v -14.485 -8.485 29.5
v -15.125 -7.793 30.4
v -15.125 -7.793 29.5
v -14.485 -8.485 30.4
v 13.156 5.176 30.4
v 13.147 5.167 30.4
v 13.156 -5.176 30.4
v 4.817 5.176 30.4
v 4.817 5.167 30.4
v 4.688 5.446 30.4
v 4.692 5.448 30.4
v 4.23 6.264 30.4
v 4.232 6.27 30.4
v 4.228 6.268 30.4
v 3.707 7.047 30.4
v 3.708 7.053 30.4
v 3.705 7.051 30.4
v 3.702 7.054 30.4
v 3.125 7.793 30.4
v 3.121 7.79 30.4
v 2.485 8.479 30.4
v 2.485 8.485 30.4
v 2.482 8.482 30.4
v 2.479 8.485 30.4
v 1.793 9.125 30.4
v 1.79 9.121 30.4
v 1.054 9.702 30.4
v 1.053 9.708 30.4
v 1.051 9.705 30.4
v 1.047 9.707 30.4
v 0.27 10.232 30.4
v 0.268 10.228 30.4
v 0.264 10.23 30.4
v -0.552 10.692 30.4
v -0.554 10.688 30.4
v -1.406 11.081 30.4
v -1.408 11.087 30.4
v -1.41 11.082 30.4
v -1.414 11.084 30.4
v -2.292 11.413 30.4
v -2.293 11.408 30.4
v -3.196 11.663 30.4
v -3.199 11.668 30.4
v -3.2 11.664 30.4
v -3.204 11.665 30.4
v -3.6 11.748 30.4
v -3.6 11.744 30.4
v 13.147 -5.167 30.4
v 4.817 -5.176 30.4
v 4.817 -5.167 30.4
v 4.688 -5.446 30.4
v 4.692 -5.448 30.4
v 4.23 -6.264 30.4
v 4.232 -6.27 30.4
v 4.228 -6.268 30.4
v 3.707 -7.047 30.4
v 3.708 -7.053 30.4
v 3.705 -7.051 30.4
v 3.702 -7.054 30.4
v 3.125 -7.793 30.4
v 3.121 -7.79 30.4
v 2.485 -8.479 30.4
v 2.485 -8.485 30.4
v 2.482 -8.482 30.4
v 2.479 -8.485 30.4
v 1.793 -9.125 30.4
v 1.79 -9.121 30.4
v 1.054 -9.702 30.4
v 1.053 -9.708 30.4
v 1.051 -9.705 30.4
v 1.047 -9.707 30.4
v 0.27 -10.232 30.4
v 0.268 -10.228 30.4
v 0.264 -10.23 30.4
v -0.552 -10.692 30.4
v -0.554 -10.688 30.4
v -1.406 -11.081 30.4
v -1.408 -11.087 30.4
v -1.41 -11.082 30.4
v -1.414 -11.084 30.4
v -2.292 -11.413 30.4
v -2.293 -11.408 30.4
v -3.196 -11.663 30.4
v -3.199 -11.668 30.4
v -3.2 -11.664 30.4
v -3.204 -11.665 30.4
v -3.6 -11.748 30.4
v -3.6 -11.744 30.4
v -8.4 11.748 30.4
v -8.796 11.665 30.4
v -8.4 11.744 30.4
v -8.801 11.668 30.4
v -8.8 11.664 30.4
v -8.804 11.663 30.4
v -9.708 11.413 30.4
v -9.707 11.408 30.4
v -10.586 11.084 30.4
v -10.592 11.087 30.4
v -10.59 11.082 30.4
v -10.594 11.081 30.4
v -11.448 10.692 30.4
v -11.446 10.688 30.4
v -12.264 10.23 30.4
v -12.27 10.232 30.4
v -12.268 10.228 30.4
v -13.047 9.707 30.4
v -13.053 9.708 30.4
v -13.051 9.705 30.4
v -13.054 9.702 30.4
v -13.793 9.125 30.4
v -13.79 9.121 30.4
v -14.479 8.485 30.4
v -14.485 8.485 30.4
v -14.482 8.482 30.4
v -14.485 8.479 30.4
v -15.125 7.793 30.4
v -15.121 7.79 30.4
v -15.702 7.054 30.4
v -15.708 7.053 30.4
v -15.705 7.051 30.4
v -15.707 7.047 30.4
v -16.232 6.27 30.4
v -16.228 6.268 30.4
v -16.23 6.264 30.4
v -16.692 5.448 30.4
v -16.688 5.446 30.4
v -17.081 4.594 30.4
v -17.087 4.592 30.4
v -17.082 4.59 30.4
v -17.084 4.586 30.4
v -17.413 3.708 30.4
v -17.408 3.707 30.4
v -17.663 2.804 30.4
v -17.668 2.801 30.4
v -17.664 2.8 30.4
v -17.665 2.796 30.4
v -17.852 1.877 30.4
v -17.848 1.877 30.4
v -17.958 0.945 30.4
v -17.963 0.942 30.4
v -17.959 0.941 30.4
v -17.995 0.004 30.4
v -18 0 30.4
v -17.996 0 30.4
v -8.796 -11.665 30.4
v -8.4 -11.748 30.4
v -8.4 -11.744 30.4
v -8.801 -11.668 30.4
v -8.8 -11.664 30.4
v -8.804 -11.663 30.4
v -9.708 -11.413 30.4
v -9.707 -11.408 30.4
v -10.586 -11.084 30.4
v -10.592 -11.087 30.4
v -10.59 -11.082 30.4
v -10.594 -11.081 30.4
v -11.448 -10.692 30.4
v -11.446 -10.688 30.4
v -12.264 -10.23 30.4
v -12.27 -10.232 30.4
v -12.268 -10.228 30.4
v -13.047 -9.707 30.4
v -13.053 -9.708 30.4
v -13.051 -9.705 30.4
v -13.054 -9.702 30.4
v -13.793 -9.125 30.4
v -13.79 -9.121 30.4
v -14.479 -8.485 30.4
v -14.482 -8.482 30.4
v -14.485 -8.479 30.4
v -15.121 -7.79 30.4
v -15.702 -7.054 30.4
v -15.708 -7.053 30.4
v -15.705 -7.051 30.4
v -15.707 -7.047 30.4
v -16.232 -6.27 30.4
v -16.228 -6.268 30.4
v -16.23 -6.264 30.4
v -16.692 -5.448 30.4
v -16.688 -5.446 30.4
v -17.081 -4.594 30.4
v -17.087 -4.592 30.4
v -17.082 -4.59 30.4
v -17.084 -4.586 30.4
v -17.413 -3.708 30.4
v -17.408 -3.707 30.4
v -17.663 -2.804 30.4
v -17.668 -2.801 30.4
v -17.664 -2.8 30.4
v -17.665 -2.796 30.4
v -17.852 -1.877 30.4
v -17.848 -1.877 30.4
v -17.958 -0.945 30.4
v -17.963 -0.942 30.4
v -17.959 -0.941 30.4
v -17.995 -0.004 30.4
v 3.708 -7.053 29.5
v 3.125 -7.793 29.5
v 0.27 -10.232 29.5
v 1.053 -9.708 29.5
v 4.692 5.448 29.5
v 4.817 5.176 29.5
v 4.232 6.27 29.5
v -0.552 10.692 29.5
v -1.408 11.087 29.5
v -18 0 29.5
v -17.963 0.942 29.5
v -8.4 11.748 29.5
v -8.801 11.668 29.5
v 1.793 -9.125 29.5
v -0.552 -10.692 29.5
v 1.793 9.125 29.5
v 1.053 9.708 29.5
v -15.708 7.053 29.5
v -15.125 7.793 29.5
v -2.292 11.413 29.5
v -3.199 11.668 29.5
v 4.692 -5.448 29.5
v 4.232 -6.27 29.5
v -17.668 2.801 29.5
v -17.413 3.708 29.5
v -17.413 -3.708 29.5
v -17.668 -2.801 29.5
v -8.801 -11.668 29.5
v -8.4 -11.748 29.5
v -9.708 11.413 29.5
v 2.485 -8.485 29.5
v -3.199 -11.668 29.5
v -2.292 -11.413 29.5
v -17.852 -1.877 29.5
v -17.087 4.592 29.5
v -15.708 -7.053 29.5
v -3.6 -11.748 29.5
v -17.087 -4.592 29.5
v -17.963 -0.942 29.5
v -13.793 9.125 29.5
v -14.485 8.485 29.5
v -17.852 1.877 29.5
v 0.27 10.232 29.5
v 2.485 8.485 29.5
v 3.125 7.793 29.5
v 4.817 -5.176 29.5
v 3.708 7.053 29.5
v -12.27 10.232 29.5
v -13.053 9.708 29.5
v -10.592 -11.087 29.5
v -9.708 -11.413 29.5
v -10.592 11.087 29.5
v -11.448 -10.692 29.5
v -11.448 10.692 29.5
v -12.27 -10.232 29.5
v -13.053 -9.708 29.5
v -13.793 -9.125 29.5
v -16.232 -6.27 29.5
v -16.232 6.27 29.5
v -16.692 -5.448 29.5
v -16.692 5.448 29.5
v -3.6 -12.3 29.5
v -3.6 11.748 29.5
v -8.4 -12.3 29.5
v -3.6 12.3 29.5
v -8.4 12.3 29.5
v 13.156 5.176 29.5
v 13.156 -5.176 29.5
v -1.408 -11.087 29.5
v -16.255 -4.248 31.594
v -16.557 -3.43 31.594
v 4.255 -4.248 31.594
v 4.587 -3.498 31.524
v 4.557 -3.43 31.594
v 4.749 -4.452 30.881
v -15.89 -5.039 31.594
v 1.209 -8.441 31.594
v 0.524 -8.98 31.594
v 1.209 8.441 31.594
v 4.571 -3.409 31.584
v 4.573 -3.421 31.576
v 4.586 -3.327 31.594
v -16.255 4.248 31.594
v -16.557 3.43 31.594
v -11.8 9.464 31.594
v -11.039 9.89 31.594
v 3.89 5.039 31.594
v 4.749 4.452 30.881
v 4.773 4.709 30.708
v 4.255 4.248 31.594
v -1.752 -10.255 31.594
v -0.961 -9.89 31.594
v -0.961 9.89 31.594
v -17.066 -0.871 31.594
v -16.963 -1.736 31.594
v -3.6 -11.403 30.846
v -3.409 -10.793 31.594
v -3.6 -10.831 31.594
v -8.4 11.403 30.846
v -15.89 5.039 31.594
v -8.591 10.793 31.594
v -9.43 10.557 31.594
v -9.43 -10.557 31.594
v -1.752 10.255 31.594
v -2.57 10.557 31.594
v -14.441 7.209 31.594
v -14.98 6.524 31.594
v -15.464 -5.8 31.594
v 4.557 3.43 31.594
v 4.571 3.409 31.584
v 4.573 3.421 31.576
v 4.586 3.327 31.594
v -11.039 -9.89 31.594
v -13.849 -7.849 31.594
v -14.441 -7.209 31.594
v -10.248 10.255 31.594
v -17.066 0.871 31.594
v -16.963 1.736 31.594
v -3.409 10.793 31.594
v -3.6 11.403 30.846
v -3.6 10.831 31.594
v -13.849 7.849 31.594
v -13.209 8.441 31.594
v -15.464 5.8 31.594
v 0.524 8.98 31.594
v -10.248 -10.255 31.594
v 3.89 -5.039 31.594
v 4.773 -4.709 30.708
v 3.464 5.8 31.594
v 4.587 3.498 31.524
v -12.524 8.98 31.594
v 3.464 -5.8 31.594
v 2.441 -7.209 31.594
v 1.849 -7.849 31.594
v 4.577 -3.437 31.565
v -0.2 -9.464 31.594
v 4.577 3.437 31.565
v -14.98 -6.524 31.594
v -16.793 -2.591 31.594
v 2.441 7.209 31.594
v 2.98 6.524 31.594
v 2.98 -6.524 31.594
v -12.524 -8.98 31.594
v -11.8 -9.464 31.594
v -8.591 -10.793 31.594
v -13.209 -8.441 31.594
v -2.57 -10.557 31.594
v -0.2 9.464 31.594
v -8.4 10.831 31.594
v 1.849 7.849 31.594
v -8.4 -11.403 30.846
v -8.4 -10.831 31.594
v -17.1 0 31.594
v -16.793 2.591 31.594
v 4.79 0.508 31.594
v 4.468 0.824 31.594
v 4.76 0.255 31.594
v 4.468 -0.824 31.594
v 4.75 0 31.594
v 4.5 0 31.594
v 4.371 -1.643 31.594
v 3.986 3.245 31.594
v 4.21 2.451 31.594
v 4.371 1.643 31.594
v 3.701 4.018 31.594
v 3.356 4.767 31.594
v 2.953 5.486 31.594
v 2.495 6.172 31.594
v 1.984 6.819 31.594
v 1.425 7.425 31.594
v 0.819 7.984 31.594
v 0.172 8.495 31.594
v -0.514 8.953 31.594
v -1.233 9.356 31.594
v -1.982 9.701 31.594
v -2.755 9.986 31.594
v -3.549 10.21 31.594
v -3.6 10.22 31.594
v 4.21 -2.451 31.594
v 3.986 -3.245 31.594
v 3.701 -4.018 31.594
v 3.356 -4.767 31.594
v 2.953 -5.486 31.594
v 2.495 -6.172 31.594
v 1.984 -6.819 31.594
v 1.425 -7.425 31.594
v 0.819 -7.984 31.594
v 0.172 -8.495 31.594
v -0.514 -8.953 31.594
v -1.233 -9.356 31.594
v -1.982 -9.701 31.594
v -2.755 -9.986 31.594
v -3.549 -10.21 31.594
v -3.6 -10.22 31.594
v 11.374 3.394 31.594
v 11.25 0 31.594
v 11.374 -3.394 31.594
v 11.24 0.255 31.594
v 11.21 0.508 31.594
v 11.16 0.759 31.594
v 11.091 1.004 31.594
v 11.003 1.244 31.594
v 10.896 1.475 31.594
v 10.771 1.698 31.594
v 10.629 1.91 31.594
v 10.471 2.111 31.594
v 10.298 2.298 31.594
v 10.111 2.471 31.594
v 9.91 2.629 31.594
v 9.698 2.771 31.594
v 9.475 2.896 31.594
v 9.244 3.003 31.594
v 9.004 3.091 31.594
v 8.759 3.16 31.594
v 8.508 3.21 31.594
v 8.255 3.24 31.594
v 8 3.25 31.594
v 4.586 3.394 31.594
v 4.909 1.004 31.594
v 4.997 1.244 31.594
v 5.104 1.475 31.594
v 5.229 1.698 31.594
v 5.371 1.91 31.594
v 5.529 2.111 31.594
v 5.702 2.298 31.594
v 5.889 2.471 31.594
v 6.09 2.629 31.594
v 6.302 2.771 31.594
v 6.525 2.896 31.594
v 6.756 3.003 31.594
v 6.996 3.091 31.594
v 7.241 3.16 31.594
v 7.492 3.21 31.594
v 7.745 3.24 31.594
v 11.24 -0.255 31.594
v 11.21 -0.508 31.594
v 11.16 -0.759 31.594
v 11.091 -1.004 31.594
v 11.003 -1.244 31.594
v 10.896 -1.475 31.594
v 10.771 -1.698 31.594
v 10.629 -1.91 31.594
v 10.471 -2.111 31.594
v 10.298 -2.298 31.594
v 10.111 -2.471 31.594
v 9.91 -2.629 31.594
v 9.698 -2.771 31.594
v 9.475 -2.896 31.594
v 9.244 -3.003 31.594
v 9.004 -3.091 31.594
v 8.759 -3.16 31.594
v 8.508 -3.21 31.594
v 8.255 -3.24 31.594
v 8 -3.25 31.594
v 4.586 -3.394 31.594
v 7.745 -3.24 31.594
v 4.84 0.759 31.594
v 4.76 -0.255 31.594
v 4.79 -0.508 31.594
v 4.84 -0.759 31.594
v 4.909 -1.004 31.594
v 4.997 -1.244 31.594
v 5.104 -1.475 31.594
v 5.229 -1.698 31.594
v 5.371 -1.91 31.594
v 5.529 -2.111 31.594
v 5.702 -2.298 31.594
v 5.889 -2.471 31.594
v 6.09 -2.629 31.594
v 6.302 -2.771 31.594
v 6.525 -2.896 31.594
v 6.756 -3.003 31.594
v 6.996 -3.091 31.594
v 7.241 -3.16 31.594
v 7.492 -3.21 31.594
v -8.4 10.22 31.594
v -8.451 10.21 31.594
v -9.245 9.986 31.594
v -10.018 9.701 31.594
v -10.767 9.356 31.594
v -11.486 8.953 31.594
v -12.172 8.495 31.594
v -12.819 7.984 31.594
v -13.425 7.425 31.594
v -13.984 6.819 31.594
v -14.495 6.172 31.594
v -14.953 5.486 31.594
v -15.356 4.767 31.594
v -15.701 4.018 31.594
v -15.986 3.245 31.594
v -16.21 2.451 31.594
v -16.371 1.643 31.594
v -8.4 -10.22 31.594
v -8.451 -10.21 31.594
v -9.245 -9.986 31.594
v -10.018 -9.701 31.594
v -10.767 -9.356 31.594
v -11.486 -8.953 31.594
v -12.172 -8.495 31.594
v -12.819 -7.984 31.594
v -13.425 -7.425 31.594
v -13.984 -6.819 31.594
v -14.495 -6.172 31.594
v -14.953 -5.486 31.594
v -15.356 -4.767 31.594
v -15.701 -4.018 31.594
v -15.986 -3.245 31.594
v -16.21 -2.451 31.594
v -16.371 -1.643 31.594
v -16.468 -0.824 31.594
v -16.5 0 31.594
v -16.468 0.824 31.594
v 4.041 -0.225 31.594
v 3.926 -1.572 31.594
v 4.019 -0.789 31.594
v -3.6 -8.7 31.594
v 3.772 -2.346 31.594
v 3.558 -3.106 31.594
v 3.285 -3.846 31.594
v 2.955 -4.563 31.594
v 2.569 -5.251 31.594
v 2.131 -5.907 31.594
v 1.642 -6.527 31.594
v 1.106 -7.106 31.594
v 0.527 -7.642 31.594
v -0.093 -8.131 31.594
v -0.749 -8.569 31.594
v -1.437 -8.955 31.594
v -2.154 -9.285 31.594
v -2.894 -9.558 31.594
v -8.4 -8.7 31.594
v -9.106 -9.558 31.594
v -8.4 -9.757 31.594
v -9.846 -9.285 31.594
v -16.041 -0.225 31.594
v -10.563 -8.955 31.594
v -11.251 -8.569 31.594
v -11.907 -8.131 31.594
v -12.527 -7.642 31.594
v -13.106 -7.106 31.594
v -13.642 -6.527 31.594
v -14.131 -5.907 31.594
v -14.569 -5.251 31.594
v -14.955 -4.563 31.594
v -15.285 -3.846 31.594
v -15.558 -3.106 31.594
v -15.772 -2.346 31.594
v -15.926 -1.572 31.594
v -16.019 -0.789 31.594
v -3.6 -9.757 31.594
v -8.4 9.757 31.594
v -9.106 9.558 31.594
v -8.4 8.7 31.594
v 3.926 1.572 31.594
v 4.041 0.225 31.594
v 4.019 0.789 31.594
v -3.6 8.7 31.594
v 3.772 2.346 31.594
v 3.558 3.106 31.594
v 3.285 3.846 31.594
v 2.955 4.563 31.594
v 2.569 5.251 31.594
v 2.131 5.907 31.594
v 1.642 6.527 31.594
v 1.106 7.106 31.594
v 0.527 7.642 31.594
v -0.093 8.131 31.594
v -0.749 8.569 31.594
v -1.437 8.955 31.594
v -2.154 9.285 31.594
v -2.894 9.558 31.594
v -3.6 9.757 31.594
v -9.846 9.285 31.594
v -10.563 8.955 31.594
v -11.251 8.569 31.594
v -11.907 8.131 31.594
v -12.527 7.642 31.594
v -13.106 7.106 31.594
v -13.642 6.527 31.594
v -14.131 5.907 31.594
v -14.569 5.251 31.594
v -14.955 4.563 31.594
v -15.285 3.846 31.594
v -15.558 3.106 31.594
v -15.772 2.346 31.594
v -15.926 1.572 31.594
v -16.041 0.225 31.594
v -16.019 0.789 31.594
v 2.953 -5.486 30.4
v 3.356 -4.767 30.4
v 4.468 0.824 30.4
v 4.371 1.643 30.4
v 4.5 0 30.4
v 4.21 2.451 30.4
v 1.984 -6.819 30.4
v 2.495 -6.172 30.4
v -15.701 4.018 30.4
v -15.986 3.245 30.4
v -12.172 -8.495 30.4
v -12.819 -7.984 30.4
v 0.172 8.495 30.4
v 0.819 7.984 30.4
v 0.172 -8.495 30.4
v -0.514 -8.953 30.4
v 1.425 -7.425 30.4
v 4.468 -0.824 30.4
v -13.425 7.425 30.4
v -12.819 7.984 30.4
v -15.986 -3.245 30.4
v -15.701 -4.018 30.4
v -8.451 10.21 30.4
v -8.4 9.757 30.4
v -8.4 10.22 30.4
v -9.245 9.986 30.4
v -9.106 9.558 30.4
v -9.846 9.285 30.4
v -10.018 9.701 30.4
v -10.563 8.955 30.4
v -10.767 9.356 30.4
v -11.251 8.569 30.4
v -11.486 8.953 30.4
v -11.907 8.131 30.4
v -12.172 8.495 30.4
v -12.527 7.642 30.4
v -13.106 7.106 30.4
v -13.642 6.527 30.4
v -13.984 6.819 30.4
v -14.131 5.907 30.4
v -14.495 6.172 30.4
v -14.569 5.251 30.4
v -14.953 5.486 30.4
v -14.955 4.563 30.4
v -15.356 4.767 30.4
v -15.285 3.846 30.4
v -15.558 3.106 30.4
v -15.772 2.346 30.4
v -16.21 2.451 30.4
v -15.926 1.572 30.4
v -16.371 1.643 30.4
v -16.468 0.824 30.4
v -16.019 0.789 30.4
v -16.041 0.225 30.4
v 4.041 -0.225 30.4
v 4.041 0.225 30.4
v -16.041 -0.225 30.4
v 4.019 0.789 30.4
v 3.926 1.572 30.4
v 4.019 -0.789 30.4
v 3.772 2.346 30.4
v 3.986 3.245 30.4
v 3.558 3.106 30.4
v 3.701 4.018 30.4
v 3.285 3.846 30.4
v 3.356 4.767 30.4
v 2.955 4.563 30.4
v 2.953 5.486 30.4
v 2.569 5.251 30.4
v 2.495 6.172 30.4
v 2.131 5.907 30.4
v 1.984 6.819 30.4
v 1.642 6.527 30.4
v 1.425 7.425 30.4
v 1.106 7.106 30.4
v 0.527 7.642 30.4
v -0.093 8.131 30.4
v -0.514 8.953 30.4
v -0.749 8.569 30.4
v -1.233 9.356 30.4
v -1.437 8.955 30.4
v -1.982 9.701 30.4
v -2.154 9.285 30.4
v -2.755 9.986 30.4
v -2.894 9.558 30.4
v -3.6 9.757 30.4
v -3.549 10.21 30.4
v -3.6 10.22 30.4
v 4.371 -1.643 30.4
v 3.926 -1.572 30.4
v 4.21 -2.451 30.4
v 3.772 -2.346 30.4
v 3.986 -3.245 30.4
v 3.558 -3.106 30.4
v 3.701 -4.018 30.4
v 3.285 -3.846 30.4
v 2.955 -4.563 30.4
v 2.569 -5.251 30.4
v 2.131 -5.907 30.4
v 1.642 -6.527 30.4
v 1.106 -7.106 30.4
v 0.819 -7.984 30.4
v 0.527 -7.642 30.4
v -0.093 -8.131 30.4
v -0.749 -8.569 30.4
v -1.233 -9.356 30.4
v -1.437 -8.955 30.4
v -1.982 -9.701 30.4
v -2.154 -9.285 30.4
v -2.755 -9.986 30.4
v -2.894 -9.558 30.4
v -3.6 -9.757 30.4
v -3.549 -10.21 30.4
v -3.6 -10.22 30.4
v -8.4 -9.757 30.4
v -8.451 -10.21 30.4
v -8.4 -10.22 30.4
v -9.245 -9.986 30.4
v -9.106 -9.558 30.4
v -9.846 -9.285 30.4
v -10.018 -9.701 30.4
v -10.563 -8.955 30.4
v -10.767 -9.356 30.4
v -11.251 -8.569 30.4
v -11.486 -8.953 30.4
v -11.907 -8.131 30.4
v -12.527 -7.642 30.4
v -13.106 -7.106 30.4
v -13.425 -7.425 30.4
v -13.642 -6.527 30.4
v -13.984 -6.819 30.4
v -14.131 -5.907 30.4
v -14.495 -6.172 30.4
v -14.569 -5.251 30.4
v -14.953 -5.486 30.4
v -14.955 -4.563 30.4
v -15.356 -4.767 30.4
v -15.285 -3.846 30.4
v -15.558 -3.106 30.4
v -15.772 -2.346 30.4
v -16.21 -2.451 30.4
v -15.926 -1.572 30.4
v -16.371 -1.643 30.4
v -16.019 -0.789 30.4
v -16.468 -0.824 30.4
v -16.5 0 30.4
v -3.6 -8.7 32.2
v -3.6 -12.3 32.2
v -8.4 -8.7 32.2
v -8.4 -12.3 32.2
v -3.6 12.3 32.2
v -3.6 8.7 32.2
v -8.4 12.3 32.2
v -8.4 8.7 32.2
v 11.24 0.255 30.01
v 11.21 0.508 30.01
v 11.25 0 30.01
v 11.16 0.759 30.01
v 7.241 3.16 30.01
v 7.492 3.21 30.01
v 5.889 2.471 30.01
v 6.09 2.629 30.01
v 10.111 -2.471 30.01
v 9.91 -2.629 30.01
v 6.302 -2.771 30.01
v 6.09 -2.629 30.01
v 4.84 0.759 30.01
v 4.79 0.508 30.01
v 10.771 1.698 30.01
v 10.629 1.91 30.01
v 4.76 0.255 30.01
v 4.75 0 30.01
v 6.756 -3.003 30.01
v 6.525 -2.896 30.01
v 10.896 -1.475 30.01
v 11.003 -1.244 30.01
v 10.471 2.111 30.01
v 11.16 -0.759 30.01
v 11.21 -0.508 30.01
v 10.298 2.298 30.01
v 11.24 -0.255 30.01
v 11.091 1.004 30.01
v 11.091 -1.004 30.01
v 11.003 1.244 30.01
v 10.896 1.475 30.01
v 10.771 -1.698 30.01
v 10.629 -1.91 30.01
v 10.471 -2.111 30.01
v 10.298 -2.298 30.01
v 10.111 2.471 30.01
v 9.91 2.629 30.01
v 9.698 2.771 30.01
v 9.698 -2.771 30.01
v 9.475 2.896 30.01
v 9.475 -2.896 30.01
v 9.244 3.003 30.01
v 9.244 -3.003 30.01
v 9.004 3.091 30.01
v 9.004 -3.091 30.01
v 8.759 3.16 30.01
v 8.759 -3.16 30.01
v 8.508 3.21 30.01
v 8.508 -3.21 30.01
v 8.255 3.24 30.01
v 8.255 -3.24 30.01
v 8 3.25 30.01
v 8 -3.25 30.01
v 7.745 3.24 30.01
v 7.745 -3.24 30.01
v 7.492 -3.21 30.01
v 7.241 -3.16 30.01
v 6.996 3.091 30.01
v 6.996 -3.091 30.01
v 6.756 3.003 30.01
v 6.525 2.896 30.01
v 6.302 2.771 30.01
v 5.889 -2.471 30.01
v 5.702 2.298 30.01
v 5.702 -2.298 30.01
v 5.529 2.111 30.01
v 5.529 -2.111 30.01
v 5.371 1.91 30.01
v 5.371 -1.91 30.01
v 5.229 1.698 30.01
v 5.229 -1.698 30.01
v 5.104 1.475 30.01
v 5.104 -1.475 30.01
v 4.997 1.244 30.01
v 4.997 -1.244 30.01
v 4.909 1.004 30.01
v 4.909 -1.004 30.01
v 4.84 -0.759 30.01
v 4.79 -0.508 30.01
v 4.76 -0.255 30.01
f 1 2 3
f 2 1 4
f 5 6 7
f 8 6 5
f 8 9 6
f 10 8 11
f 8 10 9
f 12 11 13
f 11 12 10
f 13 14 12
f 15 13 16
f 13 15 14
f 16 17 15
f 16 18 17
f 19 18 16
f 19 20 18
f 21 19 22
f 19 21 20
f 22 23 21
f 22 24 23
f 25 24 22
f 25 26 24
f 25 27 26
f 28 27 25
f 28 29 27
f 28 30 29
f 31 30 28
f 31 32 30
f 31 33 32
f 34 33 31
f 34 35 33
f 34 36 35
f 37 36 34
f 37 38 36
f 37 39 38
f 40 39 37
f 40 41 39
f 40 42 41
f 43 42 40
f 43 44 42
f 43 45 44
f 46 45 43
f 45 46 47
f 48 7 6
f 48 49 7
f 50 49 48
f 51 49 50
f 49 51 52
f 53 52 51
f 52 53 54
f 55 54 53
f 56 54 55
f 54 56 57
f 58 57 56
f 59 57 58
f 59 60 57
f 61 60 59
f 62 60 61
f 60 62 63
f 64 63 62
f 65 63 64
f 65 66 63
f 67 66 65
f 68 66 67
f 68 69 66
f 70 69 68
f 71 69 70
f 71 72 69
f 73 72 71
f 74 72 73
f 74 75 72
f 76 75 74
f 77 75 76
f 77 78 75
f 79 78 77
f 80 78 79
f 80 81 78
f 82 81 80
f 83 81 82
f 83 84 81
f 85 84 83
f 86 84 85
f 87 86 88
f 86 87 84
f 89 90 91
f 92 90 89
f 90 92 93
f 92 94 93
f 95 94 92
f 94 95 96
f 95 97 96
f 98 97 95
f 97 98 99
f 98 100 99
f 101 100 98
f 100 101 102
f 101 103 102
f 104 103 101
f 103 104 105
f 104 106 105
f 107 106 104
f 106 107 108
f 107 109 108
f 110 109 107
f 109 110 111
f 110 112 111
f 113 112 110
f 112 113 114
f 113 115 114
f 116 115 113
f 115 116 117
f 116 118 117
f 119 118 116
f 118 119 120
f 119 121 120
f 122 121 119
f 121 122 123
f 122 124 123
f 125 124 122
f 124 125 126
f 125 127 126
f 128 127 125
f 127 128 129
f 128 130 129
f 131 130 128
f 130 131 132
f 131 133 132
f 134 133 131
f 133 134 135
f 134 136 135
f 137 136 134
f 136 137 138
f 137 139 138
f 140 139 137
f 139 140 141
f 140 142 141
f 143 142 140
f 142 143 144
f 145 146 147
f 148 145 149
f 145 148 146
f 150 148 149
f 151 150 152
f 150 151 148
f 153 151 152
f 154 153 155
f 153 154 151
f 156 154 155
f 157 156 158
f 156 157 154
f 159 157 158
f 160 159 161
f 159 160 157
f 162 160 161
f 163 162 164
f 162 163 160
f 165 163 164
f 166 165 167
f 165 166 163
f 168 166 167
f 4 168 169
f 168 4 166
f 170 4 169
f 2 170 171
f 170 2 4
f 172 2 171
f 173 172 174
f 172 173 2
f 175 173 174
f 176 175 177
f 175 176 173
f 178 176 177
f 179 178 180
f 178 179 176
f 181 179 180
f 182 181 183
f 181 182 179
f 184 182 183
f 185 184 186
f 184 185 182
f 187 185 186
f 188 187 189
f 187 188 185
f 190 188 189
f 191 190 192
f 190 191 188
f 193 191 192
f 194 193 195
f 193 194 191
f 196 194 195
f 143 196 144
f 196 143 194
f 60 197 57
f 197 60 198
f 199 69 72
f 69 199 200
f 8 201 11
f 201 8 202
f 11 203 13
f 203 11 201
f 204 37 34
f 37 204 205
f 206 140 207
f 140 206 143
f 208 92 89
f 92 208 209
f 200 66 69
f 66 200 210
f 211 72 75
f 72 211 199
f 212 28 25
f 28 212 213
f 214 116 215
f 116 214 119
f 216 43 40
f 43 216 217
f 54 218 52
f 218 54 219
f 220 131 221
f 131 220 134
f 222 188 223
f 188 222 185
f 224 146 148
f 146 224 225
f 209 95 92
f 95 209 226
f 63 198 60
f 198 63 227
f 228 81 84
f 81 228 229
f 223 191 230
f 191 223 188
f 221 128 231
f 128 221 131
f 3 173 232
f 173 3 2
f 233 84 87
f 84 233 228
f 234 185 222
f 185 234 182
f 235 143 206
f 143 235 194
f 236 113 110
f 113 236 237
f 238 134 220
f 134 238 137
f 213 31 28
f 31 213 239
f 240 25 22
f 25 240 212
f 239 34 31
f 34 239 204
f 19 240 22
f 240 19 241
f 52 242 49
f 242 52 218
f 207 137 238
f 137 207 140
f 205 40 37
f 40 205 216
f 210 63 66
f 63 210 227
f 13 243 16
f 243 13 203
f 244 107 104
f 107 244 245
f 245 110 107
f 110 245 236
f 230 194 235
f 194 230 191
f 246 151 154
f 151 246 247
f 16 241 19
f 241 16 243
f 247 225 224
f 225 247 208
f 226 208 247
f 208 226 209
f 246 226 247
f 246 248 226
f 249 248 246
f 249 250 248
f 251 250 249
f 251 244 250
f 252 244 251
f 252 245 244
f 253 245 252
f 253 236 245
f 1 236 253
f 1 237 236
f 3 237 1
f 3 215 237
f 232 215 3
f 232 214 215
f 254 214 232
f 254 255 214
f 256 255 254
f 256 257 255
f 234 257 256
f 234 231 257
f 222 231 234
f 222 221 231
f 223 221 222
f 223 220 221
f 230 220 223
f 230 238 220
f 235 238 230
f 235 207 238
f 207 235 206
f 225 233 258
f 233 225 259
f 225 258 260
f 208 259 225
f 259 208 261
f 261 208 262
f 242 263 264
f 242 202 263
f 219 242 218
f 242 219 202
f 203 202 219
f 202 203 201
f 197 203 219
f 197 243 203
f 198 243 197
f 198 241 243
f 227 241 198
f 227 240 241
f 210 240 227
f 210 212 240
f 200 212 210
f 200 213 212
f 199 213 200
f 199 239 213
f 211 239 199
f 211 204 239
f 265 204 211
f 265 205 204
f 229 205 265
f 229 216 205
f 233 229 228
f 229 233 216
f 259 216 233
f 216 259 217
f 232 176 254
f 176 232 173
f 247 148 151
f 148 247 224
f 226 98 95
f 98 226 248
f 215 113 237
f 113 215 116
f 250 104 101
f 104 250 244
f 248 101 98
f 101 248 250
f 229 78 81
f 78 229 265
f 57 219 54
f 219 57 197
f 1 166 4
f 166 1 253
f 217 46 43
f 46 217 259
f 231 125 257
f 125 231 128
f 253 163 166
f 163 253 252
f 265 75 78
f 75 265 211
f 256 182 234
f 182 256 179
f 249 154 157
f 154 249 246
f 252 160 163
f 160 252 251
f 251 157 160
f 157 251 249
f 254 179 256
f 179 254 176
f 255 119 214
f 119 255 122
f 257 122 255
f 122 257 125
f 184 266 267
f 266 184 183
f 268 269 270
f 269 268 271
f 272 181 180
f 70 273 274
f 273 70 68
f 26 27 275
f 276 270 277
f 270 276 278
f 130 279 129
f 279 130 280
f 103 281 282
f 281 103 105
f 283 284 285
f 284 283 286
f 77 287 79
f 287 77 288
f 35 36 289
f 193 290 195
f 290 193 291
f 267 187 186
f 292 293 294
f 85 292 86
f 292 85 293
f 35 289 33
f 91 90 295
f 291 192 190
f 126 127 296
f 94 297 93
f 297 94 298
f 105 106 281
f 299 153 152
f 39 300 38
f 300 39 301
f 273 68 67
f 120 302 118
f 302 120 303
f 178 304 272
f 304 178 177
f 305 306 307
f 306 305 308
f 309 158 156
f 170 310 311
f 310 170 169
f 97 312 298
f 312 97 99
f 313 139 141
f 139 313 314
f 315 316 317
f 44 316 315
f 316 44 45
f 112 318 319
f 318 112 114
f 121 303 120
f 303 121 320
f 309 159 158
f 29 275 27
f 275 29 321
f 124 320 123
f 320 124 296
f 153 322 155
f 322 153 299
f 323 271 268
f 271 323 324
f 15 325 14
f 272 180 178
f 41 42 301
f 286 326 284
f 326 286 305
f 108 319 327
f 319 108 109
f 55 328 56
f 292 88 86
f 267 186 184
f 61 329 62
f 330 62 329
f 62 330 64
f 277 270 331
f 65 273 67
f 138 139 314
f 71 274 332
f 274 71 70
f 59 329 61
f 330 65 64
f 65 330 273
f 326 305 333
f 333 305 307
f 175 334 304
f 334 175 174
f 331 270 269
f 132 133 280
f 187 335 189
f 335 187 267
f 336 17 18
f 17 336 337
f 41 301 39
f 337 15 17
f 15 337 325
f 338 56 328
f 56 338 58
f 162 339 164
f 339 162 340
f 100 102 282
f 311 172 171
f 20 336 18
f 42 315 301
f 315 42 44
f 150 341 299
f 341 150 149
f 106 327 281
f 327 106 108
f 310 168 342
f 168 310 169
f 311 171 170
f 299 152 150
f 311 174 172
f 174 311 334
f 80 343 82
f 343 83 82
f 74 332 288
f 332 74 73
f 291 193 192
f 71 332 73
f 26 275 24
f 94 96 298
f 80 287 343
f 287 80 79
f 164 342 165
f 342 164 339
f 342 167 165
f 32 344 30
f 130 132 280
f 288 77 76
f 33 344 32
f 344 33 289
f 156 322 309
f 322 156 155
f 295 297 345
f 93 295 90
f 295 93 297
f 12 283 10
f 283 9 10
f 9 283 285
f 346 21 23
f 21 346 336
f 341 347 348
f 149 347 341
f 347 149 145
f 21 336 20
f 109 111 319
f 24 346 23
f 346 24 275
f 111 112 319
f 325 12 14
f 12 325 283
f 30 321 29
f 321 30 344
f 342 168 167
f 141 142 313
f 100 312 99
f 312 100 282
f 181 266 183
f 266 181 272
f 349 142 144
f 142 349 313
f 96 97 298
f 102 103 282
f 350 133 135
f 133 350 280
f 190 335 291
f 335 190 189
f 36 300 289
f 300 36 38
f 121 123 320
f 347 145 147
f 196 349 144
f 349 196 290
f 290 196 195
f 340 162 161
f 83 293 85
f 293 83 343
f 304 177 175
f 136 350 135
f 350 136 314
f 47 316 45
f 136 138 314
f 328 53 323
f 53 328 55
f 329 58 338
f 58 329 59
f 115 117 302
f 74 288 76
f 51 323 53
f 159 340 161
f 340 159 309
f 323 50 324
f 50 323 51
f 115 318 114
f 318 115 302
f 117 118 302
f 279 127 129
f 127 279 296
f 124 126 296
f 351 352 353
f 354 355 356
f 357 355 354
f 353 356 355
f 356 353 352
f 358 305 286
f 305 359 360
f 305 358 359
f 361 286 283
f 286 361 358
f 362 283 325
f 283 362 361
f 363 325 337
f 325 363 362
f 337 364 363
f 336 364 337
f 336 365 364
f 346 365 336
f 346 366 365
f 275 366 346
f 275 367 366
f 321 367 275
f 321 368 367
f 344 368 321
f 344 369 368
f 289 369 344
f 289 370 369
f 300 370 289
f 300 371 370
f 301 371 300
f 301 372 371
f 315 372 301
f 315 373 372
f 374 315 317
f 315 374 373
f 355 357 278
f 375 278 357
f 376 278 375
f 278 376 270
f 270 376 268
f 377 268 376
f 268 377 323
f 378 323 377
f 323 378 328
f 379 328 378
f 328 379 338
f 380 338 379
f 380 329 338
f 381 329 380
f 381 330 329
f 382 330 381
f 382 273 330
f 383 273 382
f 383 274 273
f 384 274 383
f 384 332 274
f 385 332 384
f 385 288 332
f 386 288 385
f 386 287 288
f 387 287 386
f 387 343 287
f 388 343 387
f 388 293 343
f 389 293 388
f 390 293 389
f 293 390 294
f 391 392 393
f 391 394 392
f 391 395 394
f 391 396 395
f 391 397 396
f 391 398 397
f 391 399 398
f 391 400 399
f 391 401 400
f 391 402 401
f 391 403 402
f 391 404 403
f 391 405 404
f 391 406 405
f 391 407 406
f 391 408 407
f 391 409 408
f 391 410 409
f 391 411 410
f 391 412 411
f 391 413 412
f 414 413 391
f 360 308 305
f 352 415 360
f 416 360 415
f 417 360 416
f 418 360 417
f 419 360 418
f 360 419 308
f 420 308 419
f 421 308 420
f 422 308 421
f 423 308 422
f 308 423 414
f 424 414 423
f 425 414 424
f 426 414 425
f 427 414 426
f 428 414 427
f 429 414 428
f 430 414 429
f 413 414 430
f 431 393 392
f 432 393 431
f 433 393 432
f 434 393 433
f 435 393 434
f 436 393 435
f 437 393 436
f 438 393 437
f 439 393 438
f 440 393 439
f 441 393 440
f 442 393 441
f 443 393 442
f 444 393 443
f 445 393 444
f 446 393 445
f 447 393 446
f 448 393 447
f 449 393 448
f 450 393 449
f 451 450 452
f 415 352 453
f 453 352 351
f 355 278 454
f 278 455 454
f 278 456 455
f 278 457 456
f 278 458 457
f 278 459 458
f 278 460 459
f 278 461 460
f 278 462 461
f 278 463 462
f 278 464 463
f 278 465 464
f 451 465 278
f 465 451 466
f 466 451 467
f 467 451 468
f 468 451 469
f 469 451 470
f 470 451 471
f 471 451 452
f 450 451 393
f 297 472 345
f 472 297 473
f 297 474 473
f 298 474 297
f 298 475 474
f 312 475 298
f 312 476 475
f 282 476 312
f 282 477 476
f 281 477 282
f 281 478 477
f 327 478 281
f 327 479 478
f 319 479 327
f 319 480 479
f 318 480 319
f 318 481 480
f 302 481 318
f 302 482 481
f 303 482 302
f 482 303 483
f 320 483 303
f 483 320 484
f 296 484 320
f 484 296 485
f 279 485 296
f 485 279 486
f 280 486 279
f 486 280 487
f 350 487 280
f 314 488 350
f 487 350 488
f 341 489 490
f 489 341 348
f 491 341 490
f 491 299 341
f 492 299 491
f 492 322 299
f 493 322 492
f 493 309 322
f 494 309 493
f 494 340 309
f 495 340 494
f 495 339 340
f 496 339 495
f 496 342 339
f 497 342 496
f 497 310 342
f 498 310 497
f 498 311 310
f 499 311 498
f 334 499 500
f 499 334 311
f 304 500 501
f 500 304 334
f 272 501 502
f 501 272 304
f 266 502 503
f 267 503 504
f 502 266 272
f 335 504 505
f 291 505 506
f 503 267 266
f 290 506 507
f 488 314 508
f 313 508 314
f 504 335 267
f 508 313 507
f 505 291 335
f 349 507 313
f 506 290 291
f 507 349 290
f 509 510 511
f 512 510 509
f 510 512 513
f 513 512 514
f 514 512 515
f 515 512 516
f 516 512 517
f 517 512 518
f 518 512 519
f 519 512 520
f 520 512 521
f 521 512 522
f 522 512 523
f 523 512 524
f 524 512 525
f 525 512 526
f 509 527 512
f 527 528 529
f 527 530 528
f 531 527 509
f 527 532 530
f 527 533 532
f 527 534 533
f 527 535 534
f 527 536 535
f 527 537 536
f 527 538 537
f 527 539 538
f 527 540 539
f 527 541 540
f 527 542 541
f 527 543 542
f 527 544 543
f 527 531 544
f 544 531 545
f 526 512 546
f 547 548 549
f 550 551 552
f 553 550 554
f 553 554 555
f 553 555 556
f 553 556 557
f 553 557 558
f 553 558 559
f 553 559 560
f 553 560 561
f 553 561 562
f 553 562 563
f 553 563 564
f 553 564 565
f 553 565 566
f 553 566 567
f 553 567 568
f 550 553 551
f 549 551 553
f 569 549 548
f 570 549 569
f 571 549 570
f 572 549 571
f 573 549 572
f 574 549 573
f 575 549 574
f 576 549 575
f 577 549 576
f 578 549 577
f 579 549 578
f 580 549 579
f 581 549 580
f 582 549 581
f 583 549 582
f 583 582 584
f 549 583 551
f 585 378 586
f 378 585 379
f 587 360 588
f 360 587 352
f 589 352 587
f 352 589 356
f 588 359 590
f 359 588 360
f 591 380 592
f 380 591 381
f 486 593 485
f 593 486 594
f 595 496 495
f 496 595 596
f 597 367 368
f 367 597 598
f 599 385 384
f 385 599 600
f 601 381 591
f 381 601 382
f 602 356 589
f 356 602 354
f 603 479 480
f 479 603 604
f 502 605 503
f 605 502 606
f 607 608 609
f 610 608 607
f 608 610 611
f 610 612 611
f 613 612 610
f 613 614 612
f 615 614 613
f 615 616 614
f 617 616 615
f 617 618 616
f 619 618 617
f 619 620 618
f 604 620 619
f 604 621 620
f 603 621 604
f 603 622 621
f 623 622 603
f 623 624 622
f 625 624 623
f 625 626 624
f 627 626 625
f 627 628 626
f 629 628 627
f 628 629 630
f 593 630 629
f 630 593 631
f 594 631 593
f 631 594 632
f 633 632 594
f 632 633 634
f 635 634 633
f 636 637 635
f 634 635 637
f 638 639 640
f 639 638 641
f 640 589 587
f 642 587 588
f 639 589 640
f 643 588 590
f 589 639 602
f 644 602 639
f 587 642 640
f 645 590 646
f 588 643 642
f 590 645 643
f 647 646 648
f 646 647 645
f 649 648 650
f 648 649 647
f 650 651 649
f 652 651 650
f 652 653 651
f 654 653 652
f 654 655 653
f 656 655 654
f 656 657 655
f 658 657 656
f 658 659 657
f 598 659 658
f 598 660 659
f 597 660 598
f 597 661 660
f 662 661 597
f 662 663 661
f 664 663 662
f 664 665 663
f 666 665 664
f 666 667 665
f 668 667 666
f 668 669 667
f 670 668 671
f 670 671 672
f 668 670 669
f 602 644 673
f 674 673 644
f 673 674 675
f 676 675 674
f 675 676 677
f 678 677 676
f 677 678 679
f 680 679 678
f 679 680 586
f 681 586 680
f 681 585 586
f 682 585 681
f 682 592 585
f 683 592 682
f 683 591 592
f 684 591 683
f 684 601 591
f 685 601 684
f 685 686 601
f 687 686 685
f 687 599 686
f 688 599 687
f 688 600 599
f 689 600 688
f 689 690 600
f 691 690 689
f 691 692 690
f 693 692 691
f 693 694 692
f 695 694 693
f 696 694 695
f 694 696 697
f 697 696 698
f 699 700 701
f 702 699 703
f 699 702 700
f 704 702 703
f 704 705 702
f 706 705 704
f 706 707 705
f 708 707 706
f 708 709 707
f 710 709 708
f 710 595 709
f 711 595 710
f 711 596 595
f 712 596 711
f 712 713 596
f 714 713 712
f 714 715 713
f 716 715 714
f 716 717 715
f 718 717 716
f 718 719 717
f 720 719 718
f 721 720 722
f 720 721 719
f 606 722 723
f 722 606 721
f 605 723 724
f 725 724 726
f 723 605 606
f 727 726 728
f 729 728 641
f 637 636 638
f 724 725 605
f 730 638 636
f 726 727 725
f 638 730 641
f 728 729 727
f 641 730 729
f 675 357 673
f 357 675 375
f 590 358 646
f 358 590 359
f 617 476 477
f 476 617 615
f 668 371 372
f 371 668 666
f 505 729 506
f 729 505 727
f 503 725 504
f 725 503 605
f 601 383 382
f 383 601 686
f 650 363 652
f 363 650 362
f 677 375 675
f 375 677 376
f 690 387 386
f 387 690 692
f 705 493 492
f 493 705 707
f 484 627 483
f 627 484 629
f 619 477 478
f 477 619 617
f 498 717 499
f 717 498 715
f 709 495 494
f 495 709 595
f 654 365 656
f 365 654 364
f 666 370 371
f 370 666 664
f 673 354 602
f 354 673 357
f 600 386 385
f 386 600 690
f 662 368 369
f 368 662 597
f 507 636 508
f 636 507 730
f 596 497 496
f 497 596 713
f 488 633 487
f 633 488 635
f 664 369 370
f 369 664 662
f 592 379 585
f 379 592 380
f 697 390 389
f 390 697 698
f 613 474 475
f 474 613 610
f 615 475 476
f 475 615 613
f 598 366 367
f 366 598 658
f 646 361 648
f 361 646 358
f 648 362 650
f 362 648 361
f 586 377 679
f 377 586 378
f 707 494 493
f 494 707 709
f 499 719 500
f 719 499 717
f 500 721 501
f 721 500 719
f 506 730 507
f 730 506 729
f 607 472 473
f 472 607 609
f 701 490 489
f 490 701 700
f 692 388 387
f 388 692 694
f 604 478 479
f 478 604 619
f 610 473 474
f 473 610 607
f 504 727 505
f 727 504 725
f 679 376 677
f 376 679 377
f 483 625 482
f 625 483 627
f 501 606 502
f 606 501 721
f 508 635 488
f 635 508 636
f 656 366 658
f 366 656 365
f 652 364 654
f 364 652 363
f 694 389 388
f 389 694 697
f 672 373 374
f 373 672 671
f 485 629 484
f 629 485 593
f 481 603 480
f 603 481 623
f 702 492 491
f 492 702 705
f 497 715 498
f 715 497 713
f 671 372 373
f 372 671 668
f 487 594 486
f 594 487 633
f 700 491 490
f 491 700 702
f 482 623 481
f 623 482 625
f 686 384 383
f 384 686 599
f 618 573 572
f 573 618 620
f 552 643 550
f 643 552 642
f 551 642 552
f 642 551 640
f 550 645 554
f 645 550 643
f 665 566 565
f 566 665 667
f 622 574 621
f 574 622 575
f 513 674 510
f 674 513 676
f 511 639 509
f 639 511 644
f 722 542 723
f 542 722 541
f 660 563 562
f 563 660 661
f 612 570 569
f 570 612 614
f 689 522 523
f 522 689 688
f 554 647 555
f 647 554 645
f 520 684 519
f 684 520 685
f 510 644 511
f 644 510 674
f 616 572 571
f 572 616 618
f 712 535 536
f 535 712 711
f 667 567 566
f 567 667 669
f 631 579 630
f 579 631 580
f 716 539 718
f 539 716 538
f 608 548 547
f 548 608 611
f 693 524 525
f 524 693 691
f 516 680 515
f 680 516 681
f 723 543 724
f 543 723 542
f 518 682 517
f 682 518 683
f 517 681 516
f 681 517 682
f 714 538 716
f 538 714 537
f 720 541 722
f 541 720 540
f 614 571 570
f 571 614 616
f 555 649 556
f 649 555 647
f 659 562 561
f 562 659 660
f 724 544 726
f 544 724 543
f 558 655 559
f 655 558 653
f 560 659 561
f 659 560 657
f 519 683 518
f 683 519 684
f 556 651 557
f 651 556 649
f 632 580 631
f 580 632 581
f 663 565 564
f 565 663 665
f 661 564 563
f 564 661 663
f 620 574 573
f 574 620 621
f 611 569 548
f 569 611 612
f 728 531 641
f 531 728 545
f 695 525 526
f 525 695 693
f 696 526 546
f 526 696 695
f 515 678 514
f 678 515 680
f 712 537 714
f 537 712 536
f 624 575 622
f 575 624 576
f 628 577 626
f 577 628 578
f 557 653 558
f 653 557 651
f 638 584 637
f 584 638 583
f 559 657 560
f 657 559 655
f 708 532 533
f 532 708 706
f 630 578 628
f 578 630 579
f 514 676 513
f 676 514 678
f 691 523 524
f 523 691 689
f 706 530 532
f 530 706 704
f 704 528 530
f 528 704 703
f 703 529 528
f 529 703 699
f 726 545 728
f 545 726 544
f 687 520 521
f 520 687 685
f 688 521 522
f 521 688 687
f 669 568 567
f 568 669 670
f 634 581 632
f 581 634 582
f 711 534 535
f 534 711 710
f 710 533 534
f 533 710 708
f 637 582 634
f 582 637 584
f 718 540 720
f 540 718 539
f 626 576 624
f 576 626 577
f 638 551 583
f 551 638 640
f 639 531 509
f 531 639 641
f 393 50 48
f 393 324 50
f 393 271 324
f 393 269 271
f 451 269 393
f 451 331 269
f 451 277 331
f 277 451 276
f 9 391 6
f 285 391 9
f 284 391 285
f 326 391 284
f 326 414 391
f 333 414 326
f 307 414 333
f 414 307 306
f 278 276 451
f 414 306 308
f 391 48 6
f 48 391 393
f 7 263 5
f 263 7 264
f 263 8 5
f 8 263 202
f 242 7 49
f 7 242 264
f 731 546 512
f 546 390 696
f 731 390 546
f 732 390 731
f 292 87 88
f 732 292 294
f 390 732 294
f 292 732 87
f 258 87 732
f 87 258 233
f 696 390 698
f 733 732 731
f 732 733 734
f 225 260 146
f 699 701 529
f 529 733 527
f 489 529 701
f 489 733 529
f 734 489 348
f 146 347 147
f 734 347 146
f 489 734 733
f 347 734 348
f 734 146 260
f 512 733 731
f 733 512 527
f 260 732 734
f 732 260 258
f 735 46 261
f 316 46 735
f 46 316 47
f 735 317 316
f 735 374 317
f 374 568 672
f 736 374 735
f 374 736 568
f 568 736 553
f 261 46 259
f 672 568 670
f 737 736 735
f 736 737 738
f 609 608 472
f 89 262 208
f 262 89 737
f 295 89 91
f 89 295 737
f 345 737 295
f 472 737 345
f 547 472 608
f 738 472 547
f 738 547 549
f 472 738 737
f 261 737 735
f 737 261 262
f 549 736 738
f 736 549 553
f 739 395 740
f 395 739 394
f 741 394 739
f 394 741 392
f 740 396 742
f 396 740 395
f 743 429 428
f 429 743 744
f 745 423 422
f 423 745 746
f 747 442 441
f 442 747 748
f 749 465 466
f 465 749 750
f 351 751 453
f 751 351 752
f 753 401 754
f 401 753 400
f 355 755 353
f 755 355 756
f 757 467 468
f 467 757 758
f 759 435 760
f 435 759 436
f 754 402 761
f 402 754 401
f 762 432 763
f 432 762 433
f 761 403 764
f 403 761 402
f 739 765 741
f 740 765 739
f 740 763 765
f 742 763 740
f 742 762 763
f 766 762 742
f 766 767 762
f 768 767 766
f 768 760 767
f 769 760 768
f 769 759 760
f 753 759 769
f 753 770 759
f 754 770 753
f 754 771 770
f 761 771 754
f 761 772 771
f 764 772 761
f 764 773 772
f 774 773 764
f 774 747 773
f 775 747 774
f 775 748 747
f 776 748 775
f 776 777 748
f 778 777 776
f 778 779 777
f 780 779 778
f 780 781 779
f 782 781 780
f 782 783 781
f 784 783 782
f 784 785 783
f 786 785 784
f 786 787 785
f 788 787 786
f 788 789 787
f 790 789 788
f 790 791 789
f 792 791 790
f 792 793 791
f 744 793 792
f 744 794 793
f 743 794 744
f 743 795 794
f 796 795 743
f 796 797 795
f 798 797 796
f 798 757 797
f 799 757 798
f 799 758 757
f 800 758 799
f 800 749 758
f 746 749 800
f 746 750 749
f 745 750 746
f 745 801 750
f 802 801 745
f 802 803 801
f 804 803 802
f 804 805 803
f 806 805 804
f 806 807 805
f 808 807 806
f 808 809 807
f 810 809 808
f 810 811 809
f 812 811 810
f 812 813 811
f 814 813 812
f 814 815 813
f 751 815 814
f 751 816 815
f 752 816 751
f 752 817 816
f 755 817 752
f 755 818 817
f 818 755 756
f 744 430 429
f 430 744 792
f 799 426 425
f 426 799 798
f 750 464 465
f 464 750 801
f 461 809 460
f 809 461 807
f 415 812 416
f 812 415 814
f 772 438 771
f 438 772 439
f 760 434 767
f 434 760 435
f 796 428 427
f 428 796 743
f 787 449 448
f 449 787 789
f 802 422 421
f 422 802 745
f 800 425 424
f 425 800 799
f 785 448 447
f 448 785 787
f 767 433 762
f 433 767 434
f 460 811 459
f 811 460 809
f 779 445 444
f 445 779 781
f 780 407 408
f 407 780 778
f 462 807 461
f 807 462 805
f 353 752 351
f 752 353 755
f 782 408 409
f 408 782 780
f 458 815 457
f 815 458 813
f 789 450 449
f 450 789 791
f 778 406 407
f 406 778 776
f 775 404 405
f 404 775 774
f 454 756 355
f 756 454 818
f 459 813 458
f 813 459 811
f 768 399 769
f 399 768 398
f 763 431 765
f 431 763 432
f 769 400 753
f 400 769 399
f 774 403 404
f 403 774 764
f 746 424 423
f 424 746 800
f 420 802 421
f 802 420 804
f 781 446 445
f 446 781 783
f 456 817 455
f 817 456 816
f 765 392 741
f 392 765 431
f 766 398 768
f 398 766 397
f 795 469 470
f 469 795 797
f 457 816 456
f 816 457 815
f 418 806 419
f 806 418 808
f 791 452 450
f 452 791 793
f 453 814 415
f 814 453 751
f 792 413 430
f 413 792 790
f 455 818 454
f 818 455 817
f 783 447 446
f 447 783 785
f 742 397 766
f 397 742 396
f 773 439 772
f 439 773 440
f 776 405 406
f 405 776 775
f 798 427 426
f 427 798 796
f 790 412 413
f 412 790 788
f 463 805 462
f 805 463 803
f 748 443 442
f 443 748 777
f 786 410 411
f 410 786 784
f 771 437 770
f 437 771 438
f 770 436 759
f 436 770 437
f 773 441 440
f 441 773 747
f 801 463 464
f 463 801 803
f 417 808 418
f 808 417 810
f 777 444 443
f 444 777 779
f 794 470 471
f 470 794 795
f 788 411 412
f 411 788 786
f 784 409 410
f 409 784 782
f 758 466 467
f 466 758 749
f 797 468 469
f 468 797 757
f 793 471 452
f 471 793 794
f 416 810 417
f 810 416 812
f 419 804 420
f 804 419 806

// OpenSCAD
// 1/4" diameter by 1/16" thick magnet -- 25.4mm in one in.

$fn=80;

// import("./hummer-v15.stl");

// translate([13,0,45]) rotate([180,0,-90]) scale([0.45,0.45,0.45]) import("../orig/KHERES_ASSAULT_CANNON.stl");

// translate([-30,-40,0]) import("/Users/rross/personal/3dprint/marine/marine-on-base.stl");

translate([-6,0,29.5]) hatch();

// replacementExhaust();

module replacementExhaust() {
   difference()
   {
      translate([-19.6,24.4,0]) rotate([0,-22.7,0]) {
         cylinder(r=1.5,h=30);
         translate([0,0,2]) portedExhaust(rad=1.9,ht=26);
         rotate([90,0,0]) cylinder(r=1.5,h=5);
         sphere(r=1.5);
         translate([0,0,30]) {
            rotate([75,0,-125]) cylinder(r=1.5,h=3);
            sphere(r=1.5);
         }
      }
      // translate([-40,-20,-5]) cube([50,50,5]);
   }
}

module hatch() {
   difference() {
      scale([0.6,0.6,0.6]) {
         /* main body */
         difference() {
            union() {
               cylinder(r=40/2, h=1.5);
               translate([0,0,1.49]) cylinder(r1=40/2, r2=37/2, h=2);
            }
            difference() {
               translate([0,0,1.5]) cylinder(r=35/2, h=2.5);   
               translate([0,0,1.4]) cylinder(r=33.5/2, h=2.7);   
            }
            translate([-34.05/2,-0.375,1.5]) cube([34.1,0.75,2.5]);
         }
         
         /* cubes on sides that attach hatch doors */
         translate([0,-17.5,2.25]) cube([8,6,4.5], center=true);
         translate([0,17.5,2.25]) cube([8,6,4.5], center=true);
   
         /* offshoot that mounts weapon */
         translate([23.3,0,0]) {
            difference() {
               union() {
                  translate([0,0,1.49]) rotate([0,0,45]) cylinder(r1=12.2,r2=8,h=2, $fn=4);
                  translate([0,0,1.5/2]) cube([12.2*sqrt(2),12.2*sqrt(2),1.5],center=true);
               }
               translate([-8.2,0,1.5]) cube([5,20,6],center=true);
            }
         }
      }
      // magnet spot
      translate([14,0,0.51]) cylinder(r=26/8, h=26/16);
   }
}

module portedExhaust(rad=3,ht=12) {
   difference() {
      union() {
         cylinder(r=rad,h=ht);
      }

      for (j=[0:11]) {
         for (i=[0:3]) {
            rotate([0,0,60*i + 30*(j%2)]) translate([rad-1,0,2*j+2]) rotate([0,90,0]) cylinder(r=0.5,h=2);
         }
      }
   }
}
